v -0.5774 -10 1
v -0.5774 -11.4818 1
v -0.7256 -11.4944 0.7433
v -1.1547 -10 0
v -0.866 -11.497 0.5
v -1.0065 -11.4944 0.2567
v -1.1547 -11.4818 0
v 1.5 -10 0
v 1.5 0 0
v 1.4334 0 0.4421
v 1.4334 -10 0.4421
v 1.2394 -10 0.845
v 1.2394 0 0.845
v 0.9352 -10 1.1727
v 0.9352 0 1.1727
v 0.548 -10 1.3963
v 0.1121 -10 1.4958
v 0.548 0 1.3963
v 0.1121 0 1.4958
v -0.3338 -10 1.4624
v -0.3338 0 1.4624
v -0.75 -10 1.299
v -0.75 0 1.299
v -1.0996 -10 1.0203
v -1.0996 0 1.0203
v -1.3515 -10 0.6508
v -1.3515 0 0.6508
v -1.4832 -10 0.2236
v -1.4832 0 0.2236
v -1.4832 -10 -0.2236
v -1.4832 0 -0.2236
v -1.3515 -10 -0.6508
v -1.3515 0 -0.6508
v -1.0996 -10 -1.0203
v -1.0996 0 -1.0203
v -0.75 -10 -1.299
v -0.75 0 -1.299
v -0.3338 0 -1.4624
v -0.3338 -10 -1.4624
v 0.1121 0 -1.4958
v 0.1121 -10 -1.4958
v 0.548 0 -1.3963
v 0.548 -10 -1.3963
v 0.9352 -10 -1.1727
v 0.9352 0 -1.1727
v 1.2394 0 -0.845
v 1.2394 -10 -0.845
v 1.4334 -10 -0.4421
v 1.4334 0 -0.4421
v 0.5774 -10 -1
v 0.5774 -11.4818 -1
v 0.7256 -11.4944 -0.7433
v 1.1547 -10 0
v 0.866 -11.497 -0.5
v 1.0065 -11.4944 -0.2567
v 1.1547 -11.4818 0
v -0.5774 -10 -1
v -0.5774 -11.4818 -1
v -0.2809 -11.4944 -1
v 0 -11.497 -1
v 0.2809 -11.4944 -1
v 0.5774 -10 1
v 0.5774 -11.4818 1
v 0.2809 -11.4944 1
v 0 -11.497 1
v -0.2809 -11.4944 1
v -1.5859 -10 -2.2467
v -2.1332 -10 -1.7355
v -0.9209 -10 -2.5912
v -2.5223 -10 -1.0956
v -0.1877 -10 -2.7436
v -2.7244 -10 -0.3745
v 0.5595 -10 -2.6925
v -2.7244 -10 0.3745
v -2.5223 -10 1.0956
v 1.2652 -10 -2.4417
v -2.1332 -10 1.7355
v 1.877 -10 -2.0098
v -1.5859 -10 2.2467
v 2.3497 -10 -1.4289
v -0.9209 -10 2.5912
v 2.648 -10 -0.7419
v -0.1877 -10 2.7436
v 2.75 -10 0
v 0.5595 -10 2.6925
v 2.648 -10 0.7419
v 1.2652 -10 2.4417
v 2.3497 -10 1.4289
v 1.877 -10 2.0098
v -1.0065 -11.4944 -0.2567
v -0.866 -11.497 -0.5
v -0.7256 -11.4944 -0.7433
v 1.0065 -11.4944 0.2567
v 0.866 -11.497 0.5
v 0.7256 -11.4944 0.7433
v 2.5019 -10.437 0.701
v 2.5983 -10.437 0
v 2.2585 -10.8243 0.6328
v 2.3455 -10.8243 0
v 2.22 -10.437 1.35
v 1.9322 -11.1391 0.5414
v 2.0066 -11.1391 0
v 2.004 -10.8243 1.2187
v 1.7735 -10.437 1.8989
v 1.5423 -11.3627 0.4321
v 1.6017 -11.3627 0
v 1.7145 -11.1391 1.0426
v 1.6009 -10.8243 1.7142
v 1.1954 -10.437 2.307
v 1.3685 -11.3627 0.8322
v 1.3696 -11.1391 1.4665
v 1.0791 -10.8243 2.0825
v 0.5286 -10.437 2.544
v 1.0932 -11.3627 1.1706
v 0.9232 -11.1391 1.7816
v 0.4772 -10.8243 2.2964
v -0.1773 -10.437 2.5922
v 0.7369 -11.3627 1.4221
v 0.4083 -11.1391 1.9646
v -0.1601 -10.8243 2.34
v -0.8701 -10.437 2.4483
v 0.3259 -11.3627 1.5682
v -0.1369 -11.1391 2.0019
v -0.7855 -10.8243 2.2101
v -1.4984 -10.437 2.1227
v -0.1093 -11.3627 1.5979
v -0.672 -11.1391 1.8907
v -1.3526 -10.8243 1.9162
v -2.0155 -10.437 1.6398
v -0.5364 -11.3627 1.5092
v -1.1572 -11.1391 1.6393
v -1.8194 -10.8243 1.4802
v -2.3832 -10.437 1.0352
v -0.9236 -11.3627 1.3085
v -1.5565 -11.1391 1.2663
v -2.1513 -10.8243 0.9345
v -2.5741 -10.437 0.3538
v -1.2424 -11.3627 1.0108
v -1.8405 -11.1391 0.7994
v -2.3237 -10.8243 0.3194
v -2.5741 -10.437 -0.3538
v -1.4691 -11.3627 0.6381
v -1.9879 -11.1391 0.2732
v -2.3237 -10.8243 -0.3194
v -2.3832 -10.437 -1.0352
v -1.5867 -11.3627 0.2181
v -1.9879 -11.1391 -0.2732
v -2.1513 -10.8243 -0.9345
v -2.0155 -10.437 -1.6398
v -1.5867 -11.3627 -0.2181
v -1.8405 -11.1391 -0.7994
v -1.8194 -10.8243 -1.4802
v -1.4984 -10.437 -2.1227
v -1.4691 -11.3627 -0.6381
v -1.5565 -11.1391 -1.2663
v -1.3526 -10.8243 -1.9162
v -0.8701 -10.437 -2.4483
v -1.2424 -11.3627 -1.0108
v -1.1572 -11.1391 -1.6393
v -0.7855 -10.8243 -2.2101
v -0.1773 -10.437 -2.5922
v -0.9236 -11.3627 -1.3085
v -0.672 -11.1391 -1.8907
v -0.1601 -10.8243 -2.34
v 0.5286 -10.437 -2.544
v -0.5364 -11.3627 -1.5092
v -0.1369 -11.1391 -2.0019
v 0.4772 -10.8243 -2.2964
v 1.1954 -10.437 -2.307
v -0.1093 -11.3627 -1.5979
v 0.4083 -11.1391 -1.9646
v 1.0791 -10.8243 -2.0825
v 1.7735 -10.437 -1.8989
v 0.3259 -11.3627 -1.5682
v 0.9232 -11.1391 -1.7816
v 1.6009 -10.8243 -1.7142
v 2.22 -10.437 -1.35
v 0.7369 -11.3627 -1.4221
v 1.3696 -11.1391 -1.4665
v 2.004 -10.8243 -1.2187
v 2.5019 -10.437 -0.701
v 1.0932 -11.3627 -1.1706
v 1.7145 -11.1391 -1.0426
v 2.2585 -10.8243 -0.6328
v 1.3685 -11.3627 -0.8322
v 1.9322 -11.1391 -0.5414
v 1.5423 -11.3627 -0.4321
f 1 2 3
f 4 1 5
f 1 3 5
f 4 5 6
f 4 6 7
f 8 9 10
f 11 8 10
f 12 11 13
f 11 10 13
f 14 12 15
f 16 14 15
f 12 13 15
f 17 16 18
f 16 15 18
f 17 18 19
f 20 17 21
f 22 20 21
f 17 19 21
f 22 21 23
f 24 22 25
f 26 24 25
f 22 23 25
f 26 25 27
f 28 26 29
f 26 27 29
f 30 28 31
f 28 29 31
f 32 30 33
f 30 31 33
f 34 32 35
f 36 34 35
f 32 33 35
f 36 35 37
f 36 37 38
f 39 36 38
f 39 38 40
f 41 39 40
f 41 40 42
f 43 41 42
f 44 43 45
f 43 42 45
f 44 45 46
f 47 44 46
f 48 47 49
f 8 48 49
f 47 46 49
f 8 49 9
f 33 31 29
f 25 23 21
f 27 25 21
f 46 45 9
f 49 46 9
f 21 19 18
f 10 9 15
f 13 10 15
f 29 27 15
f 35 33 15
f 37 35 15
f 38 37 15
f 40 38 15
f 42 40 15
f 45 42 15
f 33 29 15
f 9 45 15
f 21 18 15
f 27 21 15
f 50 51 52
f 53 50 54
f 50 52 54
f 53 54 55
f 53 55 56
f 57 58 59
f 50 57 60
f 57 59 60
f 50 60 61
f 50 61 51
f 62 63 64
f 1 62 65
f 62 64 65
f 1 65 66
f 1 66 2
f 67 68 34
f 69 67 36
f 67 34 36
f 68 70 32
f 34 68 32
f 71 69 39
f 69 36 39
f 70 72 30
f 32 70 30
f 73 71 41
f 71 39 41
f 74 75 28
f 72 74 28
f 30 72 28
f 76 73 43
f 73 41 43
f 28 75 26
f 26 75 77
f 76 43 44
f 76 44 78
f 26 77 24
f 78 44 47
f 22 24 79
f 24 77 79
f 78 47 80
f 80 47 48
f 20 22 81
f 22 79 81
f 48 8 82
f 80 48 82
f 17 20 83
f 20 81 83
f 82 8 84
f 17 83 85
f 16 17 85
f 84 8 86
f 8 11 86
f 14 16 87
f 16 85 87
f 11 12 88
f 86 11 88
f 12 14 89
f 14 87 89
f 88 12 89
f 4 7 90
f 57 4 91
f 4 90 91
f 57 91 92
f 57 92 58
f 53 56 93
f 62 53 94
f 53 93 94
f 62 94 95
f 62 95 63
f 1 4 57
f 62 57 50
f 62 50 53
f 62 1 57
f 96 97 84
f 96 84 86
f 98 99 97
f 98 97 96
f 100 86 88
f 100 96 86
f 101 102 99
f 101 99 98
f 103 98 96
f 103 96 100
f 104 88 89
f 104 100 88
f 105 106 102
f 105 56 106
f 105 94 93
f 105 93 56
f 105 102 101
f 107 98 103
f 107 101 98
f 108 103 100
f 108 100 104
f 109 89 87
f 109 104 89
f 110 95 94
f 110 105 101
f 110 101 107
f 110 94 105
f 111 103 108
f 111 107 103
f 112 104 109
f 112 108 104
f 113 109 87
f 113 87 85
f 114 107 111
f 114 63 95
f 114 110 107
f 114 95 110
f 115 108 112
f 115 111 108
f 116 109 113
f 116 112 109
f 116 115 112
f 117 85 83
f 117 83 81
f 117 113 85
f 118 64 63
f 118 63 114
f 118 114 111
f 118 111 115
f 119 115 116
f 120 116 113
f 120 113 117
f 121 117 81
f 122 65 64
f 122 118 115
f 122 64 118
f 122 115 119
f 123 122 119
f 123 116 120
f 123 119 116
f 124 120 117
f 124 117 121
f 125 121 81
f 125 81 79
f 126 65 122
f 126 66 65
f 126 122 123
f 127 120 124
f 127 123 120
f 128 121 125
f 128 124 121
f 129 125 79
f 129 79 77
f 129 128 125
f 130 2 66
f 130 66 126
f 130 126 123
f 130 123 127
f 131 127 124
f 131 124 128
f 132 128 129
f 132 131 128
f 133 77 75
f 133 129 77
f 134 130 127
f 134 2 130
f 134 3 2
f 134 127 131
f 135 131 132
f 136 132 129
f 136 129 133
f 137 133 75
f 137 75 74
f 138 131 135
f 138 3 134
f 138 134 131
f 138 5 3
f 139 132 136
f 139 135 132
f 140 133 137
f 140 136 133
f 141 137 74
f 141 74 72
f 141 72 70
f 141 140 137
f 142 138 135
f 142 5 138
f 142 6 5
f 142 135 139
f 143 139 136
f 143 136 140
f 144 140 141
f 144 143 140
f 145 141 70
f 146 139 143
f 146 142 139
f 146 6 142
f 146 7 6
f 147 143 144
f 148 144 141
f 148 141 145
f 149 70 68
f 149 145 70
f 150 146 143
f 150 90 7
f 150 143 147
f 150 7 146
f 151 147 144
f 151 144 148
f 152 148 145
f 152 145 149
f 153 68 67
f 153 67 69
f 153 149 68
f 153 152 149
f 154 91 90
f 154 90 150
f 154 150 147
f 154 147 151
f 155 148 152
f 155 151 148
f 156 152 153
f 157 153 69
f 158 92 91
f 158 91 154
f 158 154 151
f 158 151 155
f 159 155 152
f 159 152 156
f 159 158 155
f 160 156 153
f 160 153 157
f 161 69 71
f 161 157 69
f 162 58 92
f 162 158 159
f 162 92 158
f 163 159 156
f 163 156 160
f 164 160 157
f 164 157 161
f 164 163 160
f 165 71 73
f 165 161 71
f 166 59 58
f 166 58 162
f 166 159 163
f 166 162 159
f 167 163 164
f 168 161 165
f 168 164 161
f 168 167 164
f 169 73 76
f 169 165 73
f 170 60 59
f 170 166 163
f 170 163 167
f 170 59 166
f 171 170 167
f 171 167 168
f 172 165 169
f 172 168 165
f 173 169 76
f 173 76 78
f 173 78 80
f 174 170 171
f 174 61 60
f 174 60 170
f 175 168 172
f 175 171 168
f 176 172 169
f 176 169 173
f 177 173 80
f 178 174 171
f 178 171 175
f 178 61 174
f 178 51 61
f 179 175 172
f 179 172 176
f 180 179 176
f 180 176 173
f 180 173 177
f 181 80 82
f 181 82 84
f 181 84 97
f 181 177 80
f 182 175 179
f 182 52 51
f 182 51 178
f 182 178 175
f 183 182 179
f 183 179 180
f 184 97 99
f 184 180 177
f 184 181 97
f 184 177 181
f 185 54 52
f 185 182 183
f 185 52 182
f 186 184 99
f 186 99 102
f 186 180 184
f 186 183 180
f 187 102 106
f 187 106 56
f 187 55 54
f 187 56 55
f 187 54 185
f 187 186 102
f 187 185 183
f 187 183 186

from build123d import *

# Parameters (mm, degrees)
F0_R     = 1.5
F1_DEPTH = 10
F2_R     = 2.75
F3_DEPTH = 1.5
F5_DEPTH = 1.5


# Not quite as in the source:
# - a fillet or chamfer that OpenCascade refuses, or shapes differently, is made with other operations: its cross-section is extruded or revolved along the edge and cut away or added


with BuildPart() as f1:
    # F0 (on Front) → F1 (new body)
    with BuildSketch(Plane.XZ):
        Circle(F0_R)
    extrude(amount=F1_DEPTH)

    # F2 (on face) → F3 (join)
    with BuildSketch(Plane.XZ.offset(10)):
        Circle(F2_R)
    extrude(amount=F3_DEPTH)

    # F4 (on face) → F5 (cut)
    with BuildSketch(Plane.XZ.offset(11.5)):
        Polygon((-0.5773502692, -1), (0.5773502692, -1), (1.1547005384, 0), (0.5773502692, 1), (-0.5773502692, 1), (-1.1547005384, 0), align=None)
    extrude(amount=-F5_DEPTH, mode=Mode.SUBTRACT)

    # F6: fillet of radius 1.9 on 1 edges, made by hand

    # F6_s1 → F6_t2 (revolve, cut)
    with BuildSketch(Plane.XY):
        with BuildLine():
            ThreePointArc((2.75, -10), (2.0863160765, -11.0781745499), (0.8925824379, -11.5))
            Line((0.8925824379, -11.5), (2.75, -11.5))
            Line((2.75, -11.5), (2.75, -10))
        make_face()
    revolve(axis=Axis((0, -11.5, 0), (0, -1, 0)), mode=Mode.SUBTRACT)


solid = f1.part
